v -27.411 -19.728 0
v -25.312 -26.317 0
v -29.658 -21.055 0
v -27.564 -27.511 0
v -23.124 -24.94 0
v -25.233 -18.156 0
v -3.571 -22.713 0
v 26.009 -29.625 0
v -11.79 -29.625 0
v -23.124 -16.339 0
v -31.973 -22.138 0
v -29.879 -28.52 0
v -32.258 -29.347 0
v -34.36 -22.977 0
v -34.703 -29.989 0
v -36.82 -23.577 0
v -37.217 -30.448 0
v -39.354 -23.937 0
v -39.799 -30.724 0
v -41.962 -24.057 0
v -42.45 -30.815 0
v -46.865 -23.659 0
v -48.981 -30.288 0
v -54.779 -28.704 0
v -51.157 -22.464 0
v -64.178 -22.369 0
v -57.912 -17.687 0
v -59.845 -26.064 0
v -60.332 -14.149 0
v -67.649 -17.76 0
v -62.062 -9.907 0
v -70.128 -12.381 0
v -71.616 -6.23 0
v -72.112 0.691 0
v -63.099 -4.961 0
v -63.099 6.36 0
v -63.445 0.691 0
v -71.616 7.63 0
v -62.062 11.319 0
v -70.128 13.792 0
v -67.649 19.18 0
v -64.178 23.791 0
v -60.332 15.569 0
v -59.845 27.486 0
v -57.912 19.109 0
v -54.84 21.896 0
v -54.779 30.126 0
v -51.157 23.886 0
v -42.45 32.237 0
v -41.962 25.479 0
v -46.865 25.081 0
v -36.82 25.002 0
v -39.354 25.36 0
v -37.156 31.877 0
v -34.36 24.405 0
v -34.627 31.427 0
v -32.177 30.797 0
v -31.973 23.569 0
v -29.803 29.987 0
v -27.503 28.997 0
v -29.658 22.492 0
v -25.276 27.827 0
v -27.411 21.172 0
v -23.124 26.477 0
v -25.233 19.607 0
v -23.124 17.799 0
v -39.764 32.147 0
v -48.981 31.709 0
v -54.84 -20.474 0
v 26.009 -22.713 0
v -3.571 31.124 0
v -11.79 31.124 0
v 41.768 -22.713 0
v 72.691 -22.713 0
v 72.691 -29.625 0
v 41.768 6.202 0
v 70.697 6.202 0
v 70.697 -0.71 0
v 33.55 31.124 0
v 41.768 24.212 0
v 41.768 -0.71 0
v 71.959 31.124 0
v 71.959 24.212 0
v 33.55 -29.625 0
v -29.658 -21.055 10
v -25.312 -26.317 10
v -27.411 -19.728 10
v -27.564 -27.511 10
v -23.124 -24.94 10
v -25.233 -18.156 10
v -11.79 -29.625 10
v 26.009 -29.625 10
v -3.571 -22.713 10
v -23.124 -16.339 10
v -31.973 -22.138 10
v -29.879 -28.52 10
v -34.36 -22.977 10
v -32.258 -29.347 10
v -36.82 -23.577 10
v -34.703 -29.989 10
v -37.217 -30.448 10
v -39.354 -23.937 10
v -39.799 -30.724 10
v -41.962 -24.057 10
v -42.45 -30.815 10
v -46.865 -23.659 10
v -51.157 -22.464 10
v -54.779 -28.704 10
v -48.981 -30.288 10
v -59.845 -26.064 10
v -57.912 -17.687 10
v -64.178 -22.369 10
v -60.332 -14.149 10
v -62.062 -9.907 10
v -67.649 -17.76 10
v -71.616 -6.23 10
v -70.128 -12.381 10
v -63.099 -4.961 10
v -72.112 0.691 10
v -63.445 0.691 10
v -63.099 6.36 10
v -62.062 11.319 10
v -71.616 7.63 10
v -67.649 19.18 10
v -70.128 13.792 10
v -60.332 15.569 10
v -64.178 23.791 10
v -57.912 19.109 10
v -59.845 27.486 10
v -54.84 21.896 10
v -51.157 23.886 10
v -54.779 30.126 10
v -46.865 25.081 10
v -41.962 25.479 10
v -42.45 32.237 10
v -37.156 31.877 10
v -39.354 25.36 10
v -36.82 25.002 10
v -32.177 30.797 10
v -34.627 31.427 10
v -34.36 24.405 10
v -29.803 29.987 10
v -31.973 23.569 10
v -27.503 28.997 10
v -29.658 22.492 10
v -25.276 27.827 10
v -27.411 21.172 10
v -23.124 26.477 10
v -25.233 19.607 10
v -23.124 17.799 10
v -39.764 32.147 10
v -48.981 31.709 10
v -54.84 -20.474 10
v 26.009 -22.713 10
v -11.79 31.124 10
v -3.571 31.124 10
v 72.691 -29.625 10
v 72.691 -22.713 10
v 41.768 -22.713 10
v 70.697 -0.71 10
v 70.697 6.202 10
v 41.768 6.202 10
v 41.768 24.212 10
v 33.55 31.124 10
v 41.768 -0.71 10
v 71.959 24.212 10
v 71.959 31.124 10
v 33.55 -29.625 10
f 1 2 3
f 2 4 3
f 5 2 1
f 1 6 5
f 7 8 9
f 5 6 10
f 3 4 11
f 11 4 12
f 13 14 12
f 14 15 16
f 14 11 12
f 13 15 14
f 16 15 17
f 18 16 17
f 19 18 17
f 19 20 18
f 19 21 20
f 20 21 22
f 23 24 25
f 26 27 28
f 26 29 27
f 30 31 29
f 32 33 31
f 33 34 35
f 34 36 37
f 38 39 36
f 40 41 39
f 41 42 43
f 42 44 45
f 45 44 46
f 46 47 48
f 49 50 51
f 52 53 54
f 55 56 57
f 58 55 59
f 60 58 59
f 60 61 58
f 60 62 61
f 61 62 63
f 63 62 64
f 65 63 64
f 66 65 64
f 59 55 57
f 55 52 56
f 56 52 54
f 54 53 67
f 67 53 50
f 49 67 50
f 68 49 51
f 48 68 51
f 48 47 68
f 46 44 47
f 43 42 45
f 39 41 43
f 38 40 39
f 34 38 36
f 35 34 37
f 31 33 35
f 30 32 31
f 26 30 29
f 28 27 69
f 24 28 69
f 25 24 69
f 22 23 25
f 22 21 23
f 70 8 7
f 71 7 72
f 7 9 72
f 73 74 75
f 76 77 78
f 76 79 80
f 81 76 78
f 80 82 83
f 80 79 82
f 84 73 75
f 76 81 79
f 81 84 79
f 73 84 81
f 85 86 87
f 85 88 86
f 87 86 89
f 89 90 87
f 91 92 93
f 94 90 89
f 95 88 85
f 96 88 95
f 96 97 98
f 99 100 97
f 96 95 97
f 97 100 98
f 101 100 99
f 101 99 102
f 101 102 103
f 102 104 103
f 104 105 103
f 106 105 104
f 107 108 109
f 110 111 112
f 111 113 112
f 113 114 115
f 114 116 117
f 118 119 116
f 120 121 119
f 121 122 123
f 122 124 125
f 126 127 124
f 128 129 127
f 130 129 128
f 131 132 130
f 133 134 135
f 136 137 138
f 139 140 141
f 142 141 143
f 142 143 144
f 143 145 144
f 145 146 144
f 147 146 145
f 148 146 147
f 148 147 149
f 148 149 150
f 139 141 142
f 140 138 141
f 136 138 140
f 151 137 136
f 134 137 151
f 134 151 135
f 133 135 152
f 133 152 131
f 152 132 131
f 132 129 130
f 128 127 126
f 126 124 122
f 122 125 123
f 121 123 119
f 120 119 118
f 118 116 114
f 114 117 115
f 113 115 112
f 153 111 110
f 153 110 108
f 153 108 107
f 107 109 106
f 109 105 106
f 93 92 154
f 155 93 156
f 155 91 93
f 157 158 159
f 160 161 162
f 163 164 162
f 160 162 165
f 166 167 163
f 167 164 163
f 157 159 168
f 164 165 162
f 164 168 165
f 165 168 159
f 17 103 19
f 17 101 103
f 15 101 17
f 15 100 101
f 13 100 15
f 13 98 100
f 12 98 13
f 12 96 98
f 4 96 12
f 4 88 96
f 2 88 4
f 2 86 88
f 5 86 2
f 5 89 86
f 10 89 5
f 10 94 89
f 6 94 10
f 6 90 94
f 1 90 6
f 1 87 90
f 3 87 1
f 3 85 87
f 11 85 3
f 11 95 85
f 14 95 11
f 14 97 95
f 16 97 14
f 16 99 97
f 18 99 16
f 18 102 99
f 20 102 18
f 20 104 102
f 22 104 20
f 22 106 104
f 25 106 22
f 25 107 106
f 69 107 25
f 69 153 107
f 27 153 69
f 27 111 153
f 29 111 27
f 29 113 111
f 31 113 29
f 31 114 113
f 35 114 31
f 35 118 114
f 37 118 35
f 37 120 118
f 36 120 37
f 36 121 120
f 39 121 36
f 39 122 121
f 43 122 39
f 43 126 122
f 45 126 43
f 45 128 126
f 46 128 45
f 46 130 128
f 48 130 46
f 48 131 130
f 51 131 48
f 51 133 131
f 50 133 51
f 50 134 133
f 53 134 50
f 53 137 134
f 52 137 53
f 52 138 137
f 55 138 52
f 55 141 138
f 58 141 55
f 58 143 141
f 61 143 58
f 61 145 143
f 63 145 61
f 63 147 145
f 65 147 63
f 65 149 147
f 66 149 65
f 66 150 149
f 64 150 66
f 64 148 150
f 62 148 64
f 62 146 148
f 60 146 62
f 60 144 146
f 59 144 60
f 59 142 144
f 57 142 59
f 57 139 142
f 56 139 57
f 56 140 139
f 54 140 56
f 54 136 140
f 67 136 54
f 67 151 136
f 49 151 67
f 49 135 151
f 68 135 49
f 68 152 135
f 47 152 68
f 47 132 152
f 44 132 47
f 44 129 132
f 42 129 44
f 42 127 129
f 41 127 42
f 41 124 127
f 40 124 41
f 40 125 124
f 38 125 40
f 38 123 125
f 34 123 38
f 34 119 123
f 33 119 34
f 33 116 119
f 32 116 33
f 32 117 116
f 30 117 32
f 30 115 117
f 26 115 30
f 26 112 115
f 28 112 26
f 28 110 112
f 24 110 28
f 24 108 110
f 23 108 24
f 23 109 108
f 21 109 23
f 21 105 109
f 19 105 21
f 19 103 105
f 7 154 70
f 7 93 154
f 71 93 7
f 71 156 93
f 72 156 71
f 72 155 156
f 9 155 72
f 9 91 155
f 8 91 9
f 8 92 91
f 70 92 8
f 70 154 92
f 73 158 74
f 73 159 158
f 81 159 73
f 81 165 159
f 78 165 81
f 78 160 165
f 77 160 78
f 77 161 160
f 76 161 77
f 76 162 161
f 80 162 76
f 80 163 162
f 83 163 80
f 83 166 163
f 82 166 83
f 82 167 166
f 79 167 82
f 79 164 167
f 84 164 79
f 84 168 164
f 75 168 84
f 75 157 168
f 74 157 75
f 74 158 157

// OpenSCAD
linear_extrude(height=10)
//text(text="C L E", font="Adventure", size=20, halign="center", valign="center");
text(text="CLE", font="Katy Berry", size=60, halign="center", valign="center");
//text(text="C L E", font="Becker Black NF:style=Regular", size=20, halign="center", valign="center");
